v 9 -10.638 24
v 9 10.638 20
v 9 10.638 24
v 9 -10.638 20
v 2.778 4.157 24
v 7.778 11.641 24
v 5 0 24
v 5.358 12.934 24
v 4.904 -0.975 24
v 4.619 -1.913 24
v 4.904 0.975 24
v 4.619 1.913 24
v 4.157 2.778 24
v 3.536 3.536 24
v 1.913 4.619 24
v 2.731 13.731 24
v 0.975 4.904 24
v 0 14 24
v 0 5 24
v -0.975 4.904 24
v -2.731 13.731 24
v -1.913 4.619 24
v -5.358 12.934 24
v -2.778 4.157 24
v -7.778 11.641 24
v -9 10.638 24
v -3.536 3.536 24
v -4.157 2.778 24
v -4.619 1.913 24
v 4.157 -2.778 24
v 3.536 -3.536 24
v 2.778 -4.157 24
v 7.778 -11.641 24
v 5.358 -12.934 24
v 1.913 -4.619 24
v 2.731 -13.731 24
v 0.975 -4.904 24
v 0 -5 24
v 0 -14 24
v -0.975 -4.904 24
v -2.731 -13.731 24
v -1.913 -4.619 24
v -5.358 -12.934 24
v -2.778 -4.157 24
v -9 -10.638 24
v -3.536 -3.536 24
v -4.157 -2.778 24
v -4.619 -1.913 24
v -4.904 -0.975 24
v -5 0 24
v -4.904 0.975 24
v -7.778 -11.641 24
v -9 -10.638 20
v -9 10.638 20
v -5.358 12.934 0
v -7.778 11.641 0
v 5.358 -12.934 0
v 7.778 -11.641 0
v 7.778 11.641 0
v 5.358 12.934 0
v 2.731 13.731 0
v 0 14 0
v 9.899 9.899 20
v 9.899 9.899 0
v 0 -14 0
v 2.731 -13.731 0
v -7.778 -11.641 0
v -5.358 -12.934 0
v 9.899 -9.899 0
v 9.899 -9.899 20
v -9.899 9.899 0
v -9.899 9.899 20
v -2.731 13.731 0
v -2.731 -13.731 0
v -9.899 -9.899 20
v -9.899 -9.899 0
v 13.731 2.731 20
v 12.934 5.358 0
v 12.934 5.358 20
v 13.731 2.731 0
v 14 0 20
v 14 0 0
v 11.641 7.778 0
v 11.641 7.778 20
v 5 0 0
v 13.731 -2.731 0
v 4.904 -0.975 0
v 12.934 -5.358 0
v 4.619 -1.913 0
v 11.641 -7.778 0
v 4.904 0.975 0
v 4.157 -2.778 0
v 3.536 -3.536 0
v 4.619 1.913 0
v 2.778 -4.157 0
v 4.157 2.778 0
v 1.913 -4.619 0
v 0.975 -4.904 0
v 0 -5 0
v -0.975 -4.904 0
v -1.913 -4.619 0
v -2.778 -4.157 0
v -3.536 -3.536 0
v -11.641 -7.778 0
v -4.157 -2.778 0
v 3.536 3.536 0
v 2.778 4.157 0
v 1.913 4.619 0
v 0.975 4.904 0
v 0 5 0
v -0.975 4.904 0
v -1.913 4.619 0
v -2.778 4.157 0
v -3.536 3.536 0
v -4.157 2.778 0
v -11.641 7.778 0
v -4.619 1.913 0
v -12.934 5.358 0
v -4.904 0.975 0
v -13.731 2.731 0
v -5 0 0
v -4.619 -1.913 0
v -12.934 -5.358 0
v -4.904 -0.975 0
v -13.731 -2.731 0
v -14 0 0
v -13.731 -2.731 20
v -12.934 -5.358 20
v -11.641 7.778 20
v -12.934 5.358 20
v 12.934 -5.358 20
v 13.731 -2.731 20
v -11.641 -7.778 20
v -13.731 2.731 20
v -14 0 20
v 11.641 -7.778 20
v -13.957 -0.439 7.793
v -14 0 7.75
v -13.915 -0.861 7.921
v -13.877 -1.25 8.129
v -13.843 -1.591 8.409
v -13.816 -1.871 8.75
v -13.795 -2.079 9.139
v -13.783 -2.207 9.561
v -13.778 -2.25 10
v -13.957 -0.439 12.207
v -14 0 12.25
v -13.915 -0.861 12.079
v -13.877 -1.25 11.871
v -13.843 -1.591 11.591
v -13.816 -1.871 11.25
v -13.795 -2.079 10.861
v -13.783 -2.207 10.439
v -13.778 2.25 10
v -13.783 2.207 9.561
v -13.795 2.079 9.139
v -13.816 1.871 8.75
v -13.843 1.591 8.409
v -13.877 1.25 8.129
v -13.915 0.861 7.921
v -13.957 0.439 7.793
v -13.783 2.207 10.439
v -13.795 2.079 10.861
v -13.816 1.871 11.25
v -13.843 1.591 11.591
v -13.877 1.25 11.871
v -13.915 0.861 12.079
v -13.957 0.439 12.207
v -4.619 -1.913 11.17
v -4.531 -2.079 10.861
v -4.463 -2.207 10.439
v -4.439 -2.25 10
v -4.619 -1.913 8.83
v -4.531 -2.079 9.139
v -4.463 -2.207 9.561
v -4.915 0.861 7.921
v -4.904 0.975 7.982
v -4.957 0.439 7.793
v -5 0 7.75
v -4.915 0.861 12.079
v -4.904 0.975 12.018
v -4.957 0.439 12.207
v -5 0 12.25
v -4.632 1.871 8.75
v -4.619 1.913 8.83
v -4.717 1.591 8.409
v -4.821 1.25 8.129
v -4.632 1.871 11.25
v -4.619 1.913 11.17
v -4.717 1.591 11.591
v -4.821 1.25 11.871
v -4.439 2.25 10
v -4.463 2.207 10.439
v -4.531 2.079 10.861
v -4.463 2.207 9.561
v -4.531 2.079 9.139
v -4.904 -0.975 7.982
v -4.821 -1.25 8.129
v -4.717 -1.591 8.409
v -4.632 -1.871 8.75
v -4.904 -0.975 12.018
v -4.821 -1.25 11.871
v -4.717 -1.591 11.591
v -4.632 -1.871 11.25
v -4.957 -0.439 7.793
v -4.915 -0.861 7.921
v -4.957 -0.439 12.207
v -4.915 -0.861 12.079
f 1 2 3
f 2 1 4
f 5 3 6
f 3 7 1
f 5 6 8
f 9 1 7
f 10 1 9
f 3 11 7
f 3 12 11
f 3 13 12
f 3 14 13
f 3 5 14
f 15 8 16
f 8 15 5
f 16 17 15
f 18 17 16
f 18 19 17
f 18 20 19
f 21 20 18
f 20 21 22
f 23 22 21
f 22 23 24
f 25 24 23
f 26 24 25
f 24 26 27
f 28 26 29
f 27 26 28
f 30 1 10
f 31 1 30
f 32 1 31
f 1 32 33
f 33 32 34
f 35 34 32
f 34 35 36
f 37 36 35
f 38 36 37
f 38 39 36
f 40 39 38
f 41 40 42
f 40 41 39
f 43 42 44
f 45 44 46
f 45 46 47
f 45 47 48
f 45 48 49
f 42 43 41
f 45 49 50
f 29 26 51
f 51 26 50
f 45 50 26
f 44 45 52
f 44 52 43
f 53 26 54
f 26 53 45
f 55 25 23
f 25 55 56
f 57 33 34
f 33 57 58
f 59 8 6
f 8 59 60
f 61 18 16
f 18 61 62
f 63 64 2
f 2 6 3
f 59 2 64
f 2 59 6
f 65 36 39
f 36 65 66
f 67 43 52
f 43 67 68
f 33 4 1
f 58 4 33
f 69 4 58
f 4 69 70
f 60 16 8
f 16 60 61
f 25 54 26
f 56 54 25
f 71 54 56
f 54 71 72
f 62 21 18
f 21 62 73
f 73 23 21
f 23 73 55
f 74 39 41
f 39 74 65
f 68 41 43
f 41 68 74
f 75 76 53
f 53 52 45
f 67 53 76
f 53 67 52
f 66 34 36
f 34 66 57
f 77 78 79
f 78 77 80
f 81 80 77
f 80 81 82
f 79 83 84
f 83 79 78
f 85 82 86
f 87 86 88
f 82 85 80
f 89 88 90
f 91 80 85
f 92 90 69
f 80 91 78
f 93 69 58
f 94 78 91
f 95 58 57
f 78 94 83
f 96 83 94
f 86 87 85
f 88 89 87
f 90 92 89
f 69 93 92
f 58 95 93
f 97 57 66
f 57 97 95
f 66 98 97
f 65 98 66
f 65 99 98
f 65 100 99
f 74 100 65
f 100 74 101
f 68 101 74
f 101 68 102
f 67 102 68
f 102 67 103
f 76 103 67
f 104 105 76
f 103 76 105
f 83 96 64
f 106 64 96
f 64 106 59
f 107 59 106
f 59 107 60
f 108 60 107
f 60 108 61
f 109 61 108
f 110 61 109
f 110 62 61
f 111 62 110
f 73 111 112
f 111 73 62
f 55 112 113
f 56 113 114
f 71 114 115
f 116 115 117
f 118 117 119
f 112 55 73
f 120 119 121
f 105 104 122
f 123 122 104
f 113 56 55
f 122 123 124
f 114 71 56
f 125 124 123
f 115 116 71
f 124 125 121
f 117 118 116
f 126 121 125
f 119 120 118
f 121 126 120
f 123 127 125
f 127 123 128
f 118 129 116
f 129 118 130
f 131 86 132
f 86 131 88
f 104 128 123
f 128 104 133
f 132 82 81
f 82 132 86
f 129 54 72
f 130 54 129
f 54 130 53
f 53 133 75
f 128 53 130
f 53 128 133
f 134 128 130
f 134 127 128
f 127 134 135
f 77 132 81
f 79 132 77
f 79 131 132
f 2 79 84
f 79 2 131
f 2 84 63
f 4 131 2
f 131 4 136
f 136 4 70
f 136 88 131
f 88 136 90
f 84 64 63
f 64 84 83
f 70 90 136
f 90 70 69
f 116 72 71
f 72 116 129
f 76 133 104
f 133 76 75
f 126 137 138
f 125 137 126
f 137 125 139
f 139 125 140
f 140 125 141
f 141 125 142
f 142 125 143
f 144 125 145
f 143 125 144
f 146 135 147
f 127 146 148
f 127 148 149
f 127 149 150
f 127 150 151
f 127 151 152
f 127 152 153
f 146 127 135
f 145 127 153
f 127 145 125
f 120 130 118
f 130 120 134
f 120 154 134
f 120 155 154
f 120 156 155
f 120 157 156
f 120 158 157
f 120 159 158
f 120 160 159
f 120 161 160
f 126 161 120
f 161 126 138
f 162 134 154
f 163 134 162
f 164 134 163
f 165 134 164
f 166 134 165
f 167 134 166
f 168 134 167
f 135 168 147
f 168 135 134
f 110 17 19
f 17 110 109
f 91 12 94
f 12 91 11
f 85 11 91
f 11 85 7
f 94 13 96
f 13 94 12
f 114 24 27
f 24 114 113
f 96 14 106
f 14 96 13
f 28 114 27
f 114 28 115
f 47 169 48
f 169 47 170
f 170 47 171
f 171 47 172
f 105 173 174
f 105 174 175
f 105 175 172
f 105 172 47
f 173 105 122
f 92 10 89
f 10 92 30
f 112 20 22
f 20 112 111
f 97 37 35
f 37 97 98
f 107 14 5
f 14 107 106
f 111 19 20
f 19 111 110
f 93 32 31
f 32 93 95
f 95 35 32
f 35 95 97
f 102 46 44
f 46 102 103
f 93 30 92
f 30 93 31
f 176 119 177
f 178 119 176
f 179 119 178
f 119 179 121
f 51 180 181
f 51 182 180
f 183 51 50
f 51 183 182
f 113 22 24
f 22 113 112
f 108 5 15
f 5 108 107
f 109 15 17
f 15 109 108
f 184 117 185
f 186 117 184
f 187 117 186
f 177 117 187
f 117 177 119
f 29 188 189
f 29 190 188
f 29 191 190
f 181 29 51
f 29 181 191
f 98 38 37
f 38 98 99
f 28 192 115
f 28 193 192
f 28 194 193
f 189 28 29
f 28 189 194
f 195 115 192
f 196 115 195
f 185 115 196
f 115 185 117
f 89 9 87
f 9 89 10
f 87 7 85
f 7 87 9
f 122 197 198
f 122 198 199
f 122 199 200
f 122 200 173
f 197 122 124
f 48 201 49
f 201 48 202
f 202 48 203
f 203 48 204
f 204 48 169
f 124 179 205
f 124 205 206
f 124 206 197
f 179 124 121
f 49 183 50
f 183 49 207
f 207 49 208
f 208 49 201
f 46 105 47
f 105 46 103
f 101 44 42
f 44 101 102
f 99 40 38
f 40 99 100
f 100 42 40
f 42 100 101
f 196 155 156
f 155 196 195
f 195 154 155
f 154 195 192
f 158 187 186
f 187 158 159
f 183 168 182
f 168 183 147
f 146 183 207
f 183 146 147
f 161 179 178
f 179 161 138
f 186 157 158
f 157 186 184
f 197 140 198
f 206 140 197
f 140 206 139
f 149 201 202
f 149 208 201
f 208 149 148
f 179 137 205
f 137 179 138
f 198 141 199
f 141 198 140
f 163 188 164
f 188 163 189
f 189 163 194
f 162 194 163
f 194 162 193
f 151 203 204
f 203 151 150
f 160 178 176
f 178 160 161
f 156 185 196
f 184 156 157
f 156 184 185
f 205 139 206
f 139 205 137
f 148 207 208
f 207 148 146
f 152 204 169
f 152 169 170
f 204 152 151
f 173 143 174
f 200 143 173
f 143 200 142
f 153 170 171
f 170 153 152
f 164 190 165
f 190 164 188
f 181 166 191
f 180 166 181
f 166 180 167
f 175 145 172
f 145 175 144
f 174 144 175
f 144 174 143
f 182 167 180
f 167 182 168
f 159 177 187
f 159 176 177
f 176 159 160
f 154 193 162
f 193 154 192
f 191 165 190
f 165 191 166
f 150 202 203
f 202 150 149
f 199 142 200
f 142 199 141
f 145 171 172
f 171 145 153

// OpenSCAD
$fn = 32;

// ----------------------------------------------------------------------
// Oldham coupling hub: 28 x 24 mm
// ----------------------------------------------------------------------

// --- parameters (mm) ---
flange_dia = 28;          // hub diameter
flange_len = 20;          // hub length
hub_bore = 10;            // shaft bore
key_w = 18;               // drive tongue width
tongue_h = 4;             // drive tongue height
set_d = 4.5;              // set screw tap hole

module hub() {
  cylinder(h = flange_len, d = flange_dia);
  /* tongue, clipped to the hub disc and sunk 1 mm into the face */
  intersection() {
    translate([-key_w / 2, -flange_dia / 2, flange_len - 1])
      cube([key_w, flange_dia, tongue_h + 1]);
    translate([0, 0, flange_len - 1]) cylinder(h = tongue_h + 1, d = flange_dia);
  }
}

difference() {
  hub();
  translate([0, 0, -1]) cylinder(h = flange_len + tongue_h + 2, d = hub_bore);
  translate([-flange_dia / 2 - 1, 0, flange_len * 0.5])
    rotate([0, 90, 0]) cylinder(h = flange_dia / 2 + 2, d = set_d);
}
